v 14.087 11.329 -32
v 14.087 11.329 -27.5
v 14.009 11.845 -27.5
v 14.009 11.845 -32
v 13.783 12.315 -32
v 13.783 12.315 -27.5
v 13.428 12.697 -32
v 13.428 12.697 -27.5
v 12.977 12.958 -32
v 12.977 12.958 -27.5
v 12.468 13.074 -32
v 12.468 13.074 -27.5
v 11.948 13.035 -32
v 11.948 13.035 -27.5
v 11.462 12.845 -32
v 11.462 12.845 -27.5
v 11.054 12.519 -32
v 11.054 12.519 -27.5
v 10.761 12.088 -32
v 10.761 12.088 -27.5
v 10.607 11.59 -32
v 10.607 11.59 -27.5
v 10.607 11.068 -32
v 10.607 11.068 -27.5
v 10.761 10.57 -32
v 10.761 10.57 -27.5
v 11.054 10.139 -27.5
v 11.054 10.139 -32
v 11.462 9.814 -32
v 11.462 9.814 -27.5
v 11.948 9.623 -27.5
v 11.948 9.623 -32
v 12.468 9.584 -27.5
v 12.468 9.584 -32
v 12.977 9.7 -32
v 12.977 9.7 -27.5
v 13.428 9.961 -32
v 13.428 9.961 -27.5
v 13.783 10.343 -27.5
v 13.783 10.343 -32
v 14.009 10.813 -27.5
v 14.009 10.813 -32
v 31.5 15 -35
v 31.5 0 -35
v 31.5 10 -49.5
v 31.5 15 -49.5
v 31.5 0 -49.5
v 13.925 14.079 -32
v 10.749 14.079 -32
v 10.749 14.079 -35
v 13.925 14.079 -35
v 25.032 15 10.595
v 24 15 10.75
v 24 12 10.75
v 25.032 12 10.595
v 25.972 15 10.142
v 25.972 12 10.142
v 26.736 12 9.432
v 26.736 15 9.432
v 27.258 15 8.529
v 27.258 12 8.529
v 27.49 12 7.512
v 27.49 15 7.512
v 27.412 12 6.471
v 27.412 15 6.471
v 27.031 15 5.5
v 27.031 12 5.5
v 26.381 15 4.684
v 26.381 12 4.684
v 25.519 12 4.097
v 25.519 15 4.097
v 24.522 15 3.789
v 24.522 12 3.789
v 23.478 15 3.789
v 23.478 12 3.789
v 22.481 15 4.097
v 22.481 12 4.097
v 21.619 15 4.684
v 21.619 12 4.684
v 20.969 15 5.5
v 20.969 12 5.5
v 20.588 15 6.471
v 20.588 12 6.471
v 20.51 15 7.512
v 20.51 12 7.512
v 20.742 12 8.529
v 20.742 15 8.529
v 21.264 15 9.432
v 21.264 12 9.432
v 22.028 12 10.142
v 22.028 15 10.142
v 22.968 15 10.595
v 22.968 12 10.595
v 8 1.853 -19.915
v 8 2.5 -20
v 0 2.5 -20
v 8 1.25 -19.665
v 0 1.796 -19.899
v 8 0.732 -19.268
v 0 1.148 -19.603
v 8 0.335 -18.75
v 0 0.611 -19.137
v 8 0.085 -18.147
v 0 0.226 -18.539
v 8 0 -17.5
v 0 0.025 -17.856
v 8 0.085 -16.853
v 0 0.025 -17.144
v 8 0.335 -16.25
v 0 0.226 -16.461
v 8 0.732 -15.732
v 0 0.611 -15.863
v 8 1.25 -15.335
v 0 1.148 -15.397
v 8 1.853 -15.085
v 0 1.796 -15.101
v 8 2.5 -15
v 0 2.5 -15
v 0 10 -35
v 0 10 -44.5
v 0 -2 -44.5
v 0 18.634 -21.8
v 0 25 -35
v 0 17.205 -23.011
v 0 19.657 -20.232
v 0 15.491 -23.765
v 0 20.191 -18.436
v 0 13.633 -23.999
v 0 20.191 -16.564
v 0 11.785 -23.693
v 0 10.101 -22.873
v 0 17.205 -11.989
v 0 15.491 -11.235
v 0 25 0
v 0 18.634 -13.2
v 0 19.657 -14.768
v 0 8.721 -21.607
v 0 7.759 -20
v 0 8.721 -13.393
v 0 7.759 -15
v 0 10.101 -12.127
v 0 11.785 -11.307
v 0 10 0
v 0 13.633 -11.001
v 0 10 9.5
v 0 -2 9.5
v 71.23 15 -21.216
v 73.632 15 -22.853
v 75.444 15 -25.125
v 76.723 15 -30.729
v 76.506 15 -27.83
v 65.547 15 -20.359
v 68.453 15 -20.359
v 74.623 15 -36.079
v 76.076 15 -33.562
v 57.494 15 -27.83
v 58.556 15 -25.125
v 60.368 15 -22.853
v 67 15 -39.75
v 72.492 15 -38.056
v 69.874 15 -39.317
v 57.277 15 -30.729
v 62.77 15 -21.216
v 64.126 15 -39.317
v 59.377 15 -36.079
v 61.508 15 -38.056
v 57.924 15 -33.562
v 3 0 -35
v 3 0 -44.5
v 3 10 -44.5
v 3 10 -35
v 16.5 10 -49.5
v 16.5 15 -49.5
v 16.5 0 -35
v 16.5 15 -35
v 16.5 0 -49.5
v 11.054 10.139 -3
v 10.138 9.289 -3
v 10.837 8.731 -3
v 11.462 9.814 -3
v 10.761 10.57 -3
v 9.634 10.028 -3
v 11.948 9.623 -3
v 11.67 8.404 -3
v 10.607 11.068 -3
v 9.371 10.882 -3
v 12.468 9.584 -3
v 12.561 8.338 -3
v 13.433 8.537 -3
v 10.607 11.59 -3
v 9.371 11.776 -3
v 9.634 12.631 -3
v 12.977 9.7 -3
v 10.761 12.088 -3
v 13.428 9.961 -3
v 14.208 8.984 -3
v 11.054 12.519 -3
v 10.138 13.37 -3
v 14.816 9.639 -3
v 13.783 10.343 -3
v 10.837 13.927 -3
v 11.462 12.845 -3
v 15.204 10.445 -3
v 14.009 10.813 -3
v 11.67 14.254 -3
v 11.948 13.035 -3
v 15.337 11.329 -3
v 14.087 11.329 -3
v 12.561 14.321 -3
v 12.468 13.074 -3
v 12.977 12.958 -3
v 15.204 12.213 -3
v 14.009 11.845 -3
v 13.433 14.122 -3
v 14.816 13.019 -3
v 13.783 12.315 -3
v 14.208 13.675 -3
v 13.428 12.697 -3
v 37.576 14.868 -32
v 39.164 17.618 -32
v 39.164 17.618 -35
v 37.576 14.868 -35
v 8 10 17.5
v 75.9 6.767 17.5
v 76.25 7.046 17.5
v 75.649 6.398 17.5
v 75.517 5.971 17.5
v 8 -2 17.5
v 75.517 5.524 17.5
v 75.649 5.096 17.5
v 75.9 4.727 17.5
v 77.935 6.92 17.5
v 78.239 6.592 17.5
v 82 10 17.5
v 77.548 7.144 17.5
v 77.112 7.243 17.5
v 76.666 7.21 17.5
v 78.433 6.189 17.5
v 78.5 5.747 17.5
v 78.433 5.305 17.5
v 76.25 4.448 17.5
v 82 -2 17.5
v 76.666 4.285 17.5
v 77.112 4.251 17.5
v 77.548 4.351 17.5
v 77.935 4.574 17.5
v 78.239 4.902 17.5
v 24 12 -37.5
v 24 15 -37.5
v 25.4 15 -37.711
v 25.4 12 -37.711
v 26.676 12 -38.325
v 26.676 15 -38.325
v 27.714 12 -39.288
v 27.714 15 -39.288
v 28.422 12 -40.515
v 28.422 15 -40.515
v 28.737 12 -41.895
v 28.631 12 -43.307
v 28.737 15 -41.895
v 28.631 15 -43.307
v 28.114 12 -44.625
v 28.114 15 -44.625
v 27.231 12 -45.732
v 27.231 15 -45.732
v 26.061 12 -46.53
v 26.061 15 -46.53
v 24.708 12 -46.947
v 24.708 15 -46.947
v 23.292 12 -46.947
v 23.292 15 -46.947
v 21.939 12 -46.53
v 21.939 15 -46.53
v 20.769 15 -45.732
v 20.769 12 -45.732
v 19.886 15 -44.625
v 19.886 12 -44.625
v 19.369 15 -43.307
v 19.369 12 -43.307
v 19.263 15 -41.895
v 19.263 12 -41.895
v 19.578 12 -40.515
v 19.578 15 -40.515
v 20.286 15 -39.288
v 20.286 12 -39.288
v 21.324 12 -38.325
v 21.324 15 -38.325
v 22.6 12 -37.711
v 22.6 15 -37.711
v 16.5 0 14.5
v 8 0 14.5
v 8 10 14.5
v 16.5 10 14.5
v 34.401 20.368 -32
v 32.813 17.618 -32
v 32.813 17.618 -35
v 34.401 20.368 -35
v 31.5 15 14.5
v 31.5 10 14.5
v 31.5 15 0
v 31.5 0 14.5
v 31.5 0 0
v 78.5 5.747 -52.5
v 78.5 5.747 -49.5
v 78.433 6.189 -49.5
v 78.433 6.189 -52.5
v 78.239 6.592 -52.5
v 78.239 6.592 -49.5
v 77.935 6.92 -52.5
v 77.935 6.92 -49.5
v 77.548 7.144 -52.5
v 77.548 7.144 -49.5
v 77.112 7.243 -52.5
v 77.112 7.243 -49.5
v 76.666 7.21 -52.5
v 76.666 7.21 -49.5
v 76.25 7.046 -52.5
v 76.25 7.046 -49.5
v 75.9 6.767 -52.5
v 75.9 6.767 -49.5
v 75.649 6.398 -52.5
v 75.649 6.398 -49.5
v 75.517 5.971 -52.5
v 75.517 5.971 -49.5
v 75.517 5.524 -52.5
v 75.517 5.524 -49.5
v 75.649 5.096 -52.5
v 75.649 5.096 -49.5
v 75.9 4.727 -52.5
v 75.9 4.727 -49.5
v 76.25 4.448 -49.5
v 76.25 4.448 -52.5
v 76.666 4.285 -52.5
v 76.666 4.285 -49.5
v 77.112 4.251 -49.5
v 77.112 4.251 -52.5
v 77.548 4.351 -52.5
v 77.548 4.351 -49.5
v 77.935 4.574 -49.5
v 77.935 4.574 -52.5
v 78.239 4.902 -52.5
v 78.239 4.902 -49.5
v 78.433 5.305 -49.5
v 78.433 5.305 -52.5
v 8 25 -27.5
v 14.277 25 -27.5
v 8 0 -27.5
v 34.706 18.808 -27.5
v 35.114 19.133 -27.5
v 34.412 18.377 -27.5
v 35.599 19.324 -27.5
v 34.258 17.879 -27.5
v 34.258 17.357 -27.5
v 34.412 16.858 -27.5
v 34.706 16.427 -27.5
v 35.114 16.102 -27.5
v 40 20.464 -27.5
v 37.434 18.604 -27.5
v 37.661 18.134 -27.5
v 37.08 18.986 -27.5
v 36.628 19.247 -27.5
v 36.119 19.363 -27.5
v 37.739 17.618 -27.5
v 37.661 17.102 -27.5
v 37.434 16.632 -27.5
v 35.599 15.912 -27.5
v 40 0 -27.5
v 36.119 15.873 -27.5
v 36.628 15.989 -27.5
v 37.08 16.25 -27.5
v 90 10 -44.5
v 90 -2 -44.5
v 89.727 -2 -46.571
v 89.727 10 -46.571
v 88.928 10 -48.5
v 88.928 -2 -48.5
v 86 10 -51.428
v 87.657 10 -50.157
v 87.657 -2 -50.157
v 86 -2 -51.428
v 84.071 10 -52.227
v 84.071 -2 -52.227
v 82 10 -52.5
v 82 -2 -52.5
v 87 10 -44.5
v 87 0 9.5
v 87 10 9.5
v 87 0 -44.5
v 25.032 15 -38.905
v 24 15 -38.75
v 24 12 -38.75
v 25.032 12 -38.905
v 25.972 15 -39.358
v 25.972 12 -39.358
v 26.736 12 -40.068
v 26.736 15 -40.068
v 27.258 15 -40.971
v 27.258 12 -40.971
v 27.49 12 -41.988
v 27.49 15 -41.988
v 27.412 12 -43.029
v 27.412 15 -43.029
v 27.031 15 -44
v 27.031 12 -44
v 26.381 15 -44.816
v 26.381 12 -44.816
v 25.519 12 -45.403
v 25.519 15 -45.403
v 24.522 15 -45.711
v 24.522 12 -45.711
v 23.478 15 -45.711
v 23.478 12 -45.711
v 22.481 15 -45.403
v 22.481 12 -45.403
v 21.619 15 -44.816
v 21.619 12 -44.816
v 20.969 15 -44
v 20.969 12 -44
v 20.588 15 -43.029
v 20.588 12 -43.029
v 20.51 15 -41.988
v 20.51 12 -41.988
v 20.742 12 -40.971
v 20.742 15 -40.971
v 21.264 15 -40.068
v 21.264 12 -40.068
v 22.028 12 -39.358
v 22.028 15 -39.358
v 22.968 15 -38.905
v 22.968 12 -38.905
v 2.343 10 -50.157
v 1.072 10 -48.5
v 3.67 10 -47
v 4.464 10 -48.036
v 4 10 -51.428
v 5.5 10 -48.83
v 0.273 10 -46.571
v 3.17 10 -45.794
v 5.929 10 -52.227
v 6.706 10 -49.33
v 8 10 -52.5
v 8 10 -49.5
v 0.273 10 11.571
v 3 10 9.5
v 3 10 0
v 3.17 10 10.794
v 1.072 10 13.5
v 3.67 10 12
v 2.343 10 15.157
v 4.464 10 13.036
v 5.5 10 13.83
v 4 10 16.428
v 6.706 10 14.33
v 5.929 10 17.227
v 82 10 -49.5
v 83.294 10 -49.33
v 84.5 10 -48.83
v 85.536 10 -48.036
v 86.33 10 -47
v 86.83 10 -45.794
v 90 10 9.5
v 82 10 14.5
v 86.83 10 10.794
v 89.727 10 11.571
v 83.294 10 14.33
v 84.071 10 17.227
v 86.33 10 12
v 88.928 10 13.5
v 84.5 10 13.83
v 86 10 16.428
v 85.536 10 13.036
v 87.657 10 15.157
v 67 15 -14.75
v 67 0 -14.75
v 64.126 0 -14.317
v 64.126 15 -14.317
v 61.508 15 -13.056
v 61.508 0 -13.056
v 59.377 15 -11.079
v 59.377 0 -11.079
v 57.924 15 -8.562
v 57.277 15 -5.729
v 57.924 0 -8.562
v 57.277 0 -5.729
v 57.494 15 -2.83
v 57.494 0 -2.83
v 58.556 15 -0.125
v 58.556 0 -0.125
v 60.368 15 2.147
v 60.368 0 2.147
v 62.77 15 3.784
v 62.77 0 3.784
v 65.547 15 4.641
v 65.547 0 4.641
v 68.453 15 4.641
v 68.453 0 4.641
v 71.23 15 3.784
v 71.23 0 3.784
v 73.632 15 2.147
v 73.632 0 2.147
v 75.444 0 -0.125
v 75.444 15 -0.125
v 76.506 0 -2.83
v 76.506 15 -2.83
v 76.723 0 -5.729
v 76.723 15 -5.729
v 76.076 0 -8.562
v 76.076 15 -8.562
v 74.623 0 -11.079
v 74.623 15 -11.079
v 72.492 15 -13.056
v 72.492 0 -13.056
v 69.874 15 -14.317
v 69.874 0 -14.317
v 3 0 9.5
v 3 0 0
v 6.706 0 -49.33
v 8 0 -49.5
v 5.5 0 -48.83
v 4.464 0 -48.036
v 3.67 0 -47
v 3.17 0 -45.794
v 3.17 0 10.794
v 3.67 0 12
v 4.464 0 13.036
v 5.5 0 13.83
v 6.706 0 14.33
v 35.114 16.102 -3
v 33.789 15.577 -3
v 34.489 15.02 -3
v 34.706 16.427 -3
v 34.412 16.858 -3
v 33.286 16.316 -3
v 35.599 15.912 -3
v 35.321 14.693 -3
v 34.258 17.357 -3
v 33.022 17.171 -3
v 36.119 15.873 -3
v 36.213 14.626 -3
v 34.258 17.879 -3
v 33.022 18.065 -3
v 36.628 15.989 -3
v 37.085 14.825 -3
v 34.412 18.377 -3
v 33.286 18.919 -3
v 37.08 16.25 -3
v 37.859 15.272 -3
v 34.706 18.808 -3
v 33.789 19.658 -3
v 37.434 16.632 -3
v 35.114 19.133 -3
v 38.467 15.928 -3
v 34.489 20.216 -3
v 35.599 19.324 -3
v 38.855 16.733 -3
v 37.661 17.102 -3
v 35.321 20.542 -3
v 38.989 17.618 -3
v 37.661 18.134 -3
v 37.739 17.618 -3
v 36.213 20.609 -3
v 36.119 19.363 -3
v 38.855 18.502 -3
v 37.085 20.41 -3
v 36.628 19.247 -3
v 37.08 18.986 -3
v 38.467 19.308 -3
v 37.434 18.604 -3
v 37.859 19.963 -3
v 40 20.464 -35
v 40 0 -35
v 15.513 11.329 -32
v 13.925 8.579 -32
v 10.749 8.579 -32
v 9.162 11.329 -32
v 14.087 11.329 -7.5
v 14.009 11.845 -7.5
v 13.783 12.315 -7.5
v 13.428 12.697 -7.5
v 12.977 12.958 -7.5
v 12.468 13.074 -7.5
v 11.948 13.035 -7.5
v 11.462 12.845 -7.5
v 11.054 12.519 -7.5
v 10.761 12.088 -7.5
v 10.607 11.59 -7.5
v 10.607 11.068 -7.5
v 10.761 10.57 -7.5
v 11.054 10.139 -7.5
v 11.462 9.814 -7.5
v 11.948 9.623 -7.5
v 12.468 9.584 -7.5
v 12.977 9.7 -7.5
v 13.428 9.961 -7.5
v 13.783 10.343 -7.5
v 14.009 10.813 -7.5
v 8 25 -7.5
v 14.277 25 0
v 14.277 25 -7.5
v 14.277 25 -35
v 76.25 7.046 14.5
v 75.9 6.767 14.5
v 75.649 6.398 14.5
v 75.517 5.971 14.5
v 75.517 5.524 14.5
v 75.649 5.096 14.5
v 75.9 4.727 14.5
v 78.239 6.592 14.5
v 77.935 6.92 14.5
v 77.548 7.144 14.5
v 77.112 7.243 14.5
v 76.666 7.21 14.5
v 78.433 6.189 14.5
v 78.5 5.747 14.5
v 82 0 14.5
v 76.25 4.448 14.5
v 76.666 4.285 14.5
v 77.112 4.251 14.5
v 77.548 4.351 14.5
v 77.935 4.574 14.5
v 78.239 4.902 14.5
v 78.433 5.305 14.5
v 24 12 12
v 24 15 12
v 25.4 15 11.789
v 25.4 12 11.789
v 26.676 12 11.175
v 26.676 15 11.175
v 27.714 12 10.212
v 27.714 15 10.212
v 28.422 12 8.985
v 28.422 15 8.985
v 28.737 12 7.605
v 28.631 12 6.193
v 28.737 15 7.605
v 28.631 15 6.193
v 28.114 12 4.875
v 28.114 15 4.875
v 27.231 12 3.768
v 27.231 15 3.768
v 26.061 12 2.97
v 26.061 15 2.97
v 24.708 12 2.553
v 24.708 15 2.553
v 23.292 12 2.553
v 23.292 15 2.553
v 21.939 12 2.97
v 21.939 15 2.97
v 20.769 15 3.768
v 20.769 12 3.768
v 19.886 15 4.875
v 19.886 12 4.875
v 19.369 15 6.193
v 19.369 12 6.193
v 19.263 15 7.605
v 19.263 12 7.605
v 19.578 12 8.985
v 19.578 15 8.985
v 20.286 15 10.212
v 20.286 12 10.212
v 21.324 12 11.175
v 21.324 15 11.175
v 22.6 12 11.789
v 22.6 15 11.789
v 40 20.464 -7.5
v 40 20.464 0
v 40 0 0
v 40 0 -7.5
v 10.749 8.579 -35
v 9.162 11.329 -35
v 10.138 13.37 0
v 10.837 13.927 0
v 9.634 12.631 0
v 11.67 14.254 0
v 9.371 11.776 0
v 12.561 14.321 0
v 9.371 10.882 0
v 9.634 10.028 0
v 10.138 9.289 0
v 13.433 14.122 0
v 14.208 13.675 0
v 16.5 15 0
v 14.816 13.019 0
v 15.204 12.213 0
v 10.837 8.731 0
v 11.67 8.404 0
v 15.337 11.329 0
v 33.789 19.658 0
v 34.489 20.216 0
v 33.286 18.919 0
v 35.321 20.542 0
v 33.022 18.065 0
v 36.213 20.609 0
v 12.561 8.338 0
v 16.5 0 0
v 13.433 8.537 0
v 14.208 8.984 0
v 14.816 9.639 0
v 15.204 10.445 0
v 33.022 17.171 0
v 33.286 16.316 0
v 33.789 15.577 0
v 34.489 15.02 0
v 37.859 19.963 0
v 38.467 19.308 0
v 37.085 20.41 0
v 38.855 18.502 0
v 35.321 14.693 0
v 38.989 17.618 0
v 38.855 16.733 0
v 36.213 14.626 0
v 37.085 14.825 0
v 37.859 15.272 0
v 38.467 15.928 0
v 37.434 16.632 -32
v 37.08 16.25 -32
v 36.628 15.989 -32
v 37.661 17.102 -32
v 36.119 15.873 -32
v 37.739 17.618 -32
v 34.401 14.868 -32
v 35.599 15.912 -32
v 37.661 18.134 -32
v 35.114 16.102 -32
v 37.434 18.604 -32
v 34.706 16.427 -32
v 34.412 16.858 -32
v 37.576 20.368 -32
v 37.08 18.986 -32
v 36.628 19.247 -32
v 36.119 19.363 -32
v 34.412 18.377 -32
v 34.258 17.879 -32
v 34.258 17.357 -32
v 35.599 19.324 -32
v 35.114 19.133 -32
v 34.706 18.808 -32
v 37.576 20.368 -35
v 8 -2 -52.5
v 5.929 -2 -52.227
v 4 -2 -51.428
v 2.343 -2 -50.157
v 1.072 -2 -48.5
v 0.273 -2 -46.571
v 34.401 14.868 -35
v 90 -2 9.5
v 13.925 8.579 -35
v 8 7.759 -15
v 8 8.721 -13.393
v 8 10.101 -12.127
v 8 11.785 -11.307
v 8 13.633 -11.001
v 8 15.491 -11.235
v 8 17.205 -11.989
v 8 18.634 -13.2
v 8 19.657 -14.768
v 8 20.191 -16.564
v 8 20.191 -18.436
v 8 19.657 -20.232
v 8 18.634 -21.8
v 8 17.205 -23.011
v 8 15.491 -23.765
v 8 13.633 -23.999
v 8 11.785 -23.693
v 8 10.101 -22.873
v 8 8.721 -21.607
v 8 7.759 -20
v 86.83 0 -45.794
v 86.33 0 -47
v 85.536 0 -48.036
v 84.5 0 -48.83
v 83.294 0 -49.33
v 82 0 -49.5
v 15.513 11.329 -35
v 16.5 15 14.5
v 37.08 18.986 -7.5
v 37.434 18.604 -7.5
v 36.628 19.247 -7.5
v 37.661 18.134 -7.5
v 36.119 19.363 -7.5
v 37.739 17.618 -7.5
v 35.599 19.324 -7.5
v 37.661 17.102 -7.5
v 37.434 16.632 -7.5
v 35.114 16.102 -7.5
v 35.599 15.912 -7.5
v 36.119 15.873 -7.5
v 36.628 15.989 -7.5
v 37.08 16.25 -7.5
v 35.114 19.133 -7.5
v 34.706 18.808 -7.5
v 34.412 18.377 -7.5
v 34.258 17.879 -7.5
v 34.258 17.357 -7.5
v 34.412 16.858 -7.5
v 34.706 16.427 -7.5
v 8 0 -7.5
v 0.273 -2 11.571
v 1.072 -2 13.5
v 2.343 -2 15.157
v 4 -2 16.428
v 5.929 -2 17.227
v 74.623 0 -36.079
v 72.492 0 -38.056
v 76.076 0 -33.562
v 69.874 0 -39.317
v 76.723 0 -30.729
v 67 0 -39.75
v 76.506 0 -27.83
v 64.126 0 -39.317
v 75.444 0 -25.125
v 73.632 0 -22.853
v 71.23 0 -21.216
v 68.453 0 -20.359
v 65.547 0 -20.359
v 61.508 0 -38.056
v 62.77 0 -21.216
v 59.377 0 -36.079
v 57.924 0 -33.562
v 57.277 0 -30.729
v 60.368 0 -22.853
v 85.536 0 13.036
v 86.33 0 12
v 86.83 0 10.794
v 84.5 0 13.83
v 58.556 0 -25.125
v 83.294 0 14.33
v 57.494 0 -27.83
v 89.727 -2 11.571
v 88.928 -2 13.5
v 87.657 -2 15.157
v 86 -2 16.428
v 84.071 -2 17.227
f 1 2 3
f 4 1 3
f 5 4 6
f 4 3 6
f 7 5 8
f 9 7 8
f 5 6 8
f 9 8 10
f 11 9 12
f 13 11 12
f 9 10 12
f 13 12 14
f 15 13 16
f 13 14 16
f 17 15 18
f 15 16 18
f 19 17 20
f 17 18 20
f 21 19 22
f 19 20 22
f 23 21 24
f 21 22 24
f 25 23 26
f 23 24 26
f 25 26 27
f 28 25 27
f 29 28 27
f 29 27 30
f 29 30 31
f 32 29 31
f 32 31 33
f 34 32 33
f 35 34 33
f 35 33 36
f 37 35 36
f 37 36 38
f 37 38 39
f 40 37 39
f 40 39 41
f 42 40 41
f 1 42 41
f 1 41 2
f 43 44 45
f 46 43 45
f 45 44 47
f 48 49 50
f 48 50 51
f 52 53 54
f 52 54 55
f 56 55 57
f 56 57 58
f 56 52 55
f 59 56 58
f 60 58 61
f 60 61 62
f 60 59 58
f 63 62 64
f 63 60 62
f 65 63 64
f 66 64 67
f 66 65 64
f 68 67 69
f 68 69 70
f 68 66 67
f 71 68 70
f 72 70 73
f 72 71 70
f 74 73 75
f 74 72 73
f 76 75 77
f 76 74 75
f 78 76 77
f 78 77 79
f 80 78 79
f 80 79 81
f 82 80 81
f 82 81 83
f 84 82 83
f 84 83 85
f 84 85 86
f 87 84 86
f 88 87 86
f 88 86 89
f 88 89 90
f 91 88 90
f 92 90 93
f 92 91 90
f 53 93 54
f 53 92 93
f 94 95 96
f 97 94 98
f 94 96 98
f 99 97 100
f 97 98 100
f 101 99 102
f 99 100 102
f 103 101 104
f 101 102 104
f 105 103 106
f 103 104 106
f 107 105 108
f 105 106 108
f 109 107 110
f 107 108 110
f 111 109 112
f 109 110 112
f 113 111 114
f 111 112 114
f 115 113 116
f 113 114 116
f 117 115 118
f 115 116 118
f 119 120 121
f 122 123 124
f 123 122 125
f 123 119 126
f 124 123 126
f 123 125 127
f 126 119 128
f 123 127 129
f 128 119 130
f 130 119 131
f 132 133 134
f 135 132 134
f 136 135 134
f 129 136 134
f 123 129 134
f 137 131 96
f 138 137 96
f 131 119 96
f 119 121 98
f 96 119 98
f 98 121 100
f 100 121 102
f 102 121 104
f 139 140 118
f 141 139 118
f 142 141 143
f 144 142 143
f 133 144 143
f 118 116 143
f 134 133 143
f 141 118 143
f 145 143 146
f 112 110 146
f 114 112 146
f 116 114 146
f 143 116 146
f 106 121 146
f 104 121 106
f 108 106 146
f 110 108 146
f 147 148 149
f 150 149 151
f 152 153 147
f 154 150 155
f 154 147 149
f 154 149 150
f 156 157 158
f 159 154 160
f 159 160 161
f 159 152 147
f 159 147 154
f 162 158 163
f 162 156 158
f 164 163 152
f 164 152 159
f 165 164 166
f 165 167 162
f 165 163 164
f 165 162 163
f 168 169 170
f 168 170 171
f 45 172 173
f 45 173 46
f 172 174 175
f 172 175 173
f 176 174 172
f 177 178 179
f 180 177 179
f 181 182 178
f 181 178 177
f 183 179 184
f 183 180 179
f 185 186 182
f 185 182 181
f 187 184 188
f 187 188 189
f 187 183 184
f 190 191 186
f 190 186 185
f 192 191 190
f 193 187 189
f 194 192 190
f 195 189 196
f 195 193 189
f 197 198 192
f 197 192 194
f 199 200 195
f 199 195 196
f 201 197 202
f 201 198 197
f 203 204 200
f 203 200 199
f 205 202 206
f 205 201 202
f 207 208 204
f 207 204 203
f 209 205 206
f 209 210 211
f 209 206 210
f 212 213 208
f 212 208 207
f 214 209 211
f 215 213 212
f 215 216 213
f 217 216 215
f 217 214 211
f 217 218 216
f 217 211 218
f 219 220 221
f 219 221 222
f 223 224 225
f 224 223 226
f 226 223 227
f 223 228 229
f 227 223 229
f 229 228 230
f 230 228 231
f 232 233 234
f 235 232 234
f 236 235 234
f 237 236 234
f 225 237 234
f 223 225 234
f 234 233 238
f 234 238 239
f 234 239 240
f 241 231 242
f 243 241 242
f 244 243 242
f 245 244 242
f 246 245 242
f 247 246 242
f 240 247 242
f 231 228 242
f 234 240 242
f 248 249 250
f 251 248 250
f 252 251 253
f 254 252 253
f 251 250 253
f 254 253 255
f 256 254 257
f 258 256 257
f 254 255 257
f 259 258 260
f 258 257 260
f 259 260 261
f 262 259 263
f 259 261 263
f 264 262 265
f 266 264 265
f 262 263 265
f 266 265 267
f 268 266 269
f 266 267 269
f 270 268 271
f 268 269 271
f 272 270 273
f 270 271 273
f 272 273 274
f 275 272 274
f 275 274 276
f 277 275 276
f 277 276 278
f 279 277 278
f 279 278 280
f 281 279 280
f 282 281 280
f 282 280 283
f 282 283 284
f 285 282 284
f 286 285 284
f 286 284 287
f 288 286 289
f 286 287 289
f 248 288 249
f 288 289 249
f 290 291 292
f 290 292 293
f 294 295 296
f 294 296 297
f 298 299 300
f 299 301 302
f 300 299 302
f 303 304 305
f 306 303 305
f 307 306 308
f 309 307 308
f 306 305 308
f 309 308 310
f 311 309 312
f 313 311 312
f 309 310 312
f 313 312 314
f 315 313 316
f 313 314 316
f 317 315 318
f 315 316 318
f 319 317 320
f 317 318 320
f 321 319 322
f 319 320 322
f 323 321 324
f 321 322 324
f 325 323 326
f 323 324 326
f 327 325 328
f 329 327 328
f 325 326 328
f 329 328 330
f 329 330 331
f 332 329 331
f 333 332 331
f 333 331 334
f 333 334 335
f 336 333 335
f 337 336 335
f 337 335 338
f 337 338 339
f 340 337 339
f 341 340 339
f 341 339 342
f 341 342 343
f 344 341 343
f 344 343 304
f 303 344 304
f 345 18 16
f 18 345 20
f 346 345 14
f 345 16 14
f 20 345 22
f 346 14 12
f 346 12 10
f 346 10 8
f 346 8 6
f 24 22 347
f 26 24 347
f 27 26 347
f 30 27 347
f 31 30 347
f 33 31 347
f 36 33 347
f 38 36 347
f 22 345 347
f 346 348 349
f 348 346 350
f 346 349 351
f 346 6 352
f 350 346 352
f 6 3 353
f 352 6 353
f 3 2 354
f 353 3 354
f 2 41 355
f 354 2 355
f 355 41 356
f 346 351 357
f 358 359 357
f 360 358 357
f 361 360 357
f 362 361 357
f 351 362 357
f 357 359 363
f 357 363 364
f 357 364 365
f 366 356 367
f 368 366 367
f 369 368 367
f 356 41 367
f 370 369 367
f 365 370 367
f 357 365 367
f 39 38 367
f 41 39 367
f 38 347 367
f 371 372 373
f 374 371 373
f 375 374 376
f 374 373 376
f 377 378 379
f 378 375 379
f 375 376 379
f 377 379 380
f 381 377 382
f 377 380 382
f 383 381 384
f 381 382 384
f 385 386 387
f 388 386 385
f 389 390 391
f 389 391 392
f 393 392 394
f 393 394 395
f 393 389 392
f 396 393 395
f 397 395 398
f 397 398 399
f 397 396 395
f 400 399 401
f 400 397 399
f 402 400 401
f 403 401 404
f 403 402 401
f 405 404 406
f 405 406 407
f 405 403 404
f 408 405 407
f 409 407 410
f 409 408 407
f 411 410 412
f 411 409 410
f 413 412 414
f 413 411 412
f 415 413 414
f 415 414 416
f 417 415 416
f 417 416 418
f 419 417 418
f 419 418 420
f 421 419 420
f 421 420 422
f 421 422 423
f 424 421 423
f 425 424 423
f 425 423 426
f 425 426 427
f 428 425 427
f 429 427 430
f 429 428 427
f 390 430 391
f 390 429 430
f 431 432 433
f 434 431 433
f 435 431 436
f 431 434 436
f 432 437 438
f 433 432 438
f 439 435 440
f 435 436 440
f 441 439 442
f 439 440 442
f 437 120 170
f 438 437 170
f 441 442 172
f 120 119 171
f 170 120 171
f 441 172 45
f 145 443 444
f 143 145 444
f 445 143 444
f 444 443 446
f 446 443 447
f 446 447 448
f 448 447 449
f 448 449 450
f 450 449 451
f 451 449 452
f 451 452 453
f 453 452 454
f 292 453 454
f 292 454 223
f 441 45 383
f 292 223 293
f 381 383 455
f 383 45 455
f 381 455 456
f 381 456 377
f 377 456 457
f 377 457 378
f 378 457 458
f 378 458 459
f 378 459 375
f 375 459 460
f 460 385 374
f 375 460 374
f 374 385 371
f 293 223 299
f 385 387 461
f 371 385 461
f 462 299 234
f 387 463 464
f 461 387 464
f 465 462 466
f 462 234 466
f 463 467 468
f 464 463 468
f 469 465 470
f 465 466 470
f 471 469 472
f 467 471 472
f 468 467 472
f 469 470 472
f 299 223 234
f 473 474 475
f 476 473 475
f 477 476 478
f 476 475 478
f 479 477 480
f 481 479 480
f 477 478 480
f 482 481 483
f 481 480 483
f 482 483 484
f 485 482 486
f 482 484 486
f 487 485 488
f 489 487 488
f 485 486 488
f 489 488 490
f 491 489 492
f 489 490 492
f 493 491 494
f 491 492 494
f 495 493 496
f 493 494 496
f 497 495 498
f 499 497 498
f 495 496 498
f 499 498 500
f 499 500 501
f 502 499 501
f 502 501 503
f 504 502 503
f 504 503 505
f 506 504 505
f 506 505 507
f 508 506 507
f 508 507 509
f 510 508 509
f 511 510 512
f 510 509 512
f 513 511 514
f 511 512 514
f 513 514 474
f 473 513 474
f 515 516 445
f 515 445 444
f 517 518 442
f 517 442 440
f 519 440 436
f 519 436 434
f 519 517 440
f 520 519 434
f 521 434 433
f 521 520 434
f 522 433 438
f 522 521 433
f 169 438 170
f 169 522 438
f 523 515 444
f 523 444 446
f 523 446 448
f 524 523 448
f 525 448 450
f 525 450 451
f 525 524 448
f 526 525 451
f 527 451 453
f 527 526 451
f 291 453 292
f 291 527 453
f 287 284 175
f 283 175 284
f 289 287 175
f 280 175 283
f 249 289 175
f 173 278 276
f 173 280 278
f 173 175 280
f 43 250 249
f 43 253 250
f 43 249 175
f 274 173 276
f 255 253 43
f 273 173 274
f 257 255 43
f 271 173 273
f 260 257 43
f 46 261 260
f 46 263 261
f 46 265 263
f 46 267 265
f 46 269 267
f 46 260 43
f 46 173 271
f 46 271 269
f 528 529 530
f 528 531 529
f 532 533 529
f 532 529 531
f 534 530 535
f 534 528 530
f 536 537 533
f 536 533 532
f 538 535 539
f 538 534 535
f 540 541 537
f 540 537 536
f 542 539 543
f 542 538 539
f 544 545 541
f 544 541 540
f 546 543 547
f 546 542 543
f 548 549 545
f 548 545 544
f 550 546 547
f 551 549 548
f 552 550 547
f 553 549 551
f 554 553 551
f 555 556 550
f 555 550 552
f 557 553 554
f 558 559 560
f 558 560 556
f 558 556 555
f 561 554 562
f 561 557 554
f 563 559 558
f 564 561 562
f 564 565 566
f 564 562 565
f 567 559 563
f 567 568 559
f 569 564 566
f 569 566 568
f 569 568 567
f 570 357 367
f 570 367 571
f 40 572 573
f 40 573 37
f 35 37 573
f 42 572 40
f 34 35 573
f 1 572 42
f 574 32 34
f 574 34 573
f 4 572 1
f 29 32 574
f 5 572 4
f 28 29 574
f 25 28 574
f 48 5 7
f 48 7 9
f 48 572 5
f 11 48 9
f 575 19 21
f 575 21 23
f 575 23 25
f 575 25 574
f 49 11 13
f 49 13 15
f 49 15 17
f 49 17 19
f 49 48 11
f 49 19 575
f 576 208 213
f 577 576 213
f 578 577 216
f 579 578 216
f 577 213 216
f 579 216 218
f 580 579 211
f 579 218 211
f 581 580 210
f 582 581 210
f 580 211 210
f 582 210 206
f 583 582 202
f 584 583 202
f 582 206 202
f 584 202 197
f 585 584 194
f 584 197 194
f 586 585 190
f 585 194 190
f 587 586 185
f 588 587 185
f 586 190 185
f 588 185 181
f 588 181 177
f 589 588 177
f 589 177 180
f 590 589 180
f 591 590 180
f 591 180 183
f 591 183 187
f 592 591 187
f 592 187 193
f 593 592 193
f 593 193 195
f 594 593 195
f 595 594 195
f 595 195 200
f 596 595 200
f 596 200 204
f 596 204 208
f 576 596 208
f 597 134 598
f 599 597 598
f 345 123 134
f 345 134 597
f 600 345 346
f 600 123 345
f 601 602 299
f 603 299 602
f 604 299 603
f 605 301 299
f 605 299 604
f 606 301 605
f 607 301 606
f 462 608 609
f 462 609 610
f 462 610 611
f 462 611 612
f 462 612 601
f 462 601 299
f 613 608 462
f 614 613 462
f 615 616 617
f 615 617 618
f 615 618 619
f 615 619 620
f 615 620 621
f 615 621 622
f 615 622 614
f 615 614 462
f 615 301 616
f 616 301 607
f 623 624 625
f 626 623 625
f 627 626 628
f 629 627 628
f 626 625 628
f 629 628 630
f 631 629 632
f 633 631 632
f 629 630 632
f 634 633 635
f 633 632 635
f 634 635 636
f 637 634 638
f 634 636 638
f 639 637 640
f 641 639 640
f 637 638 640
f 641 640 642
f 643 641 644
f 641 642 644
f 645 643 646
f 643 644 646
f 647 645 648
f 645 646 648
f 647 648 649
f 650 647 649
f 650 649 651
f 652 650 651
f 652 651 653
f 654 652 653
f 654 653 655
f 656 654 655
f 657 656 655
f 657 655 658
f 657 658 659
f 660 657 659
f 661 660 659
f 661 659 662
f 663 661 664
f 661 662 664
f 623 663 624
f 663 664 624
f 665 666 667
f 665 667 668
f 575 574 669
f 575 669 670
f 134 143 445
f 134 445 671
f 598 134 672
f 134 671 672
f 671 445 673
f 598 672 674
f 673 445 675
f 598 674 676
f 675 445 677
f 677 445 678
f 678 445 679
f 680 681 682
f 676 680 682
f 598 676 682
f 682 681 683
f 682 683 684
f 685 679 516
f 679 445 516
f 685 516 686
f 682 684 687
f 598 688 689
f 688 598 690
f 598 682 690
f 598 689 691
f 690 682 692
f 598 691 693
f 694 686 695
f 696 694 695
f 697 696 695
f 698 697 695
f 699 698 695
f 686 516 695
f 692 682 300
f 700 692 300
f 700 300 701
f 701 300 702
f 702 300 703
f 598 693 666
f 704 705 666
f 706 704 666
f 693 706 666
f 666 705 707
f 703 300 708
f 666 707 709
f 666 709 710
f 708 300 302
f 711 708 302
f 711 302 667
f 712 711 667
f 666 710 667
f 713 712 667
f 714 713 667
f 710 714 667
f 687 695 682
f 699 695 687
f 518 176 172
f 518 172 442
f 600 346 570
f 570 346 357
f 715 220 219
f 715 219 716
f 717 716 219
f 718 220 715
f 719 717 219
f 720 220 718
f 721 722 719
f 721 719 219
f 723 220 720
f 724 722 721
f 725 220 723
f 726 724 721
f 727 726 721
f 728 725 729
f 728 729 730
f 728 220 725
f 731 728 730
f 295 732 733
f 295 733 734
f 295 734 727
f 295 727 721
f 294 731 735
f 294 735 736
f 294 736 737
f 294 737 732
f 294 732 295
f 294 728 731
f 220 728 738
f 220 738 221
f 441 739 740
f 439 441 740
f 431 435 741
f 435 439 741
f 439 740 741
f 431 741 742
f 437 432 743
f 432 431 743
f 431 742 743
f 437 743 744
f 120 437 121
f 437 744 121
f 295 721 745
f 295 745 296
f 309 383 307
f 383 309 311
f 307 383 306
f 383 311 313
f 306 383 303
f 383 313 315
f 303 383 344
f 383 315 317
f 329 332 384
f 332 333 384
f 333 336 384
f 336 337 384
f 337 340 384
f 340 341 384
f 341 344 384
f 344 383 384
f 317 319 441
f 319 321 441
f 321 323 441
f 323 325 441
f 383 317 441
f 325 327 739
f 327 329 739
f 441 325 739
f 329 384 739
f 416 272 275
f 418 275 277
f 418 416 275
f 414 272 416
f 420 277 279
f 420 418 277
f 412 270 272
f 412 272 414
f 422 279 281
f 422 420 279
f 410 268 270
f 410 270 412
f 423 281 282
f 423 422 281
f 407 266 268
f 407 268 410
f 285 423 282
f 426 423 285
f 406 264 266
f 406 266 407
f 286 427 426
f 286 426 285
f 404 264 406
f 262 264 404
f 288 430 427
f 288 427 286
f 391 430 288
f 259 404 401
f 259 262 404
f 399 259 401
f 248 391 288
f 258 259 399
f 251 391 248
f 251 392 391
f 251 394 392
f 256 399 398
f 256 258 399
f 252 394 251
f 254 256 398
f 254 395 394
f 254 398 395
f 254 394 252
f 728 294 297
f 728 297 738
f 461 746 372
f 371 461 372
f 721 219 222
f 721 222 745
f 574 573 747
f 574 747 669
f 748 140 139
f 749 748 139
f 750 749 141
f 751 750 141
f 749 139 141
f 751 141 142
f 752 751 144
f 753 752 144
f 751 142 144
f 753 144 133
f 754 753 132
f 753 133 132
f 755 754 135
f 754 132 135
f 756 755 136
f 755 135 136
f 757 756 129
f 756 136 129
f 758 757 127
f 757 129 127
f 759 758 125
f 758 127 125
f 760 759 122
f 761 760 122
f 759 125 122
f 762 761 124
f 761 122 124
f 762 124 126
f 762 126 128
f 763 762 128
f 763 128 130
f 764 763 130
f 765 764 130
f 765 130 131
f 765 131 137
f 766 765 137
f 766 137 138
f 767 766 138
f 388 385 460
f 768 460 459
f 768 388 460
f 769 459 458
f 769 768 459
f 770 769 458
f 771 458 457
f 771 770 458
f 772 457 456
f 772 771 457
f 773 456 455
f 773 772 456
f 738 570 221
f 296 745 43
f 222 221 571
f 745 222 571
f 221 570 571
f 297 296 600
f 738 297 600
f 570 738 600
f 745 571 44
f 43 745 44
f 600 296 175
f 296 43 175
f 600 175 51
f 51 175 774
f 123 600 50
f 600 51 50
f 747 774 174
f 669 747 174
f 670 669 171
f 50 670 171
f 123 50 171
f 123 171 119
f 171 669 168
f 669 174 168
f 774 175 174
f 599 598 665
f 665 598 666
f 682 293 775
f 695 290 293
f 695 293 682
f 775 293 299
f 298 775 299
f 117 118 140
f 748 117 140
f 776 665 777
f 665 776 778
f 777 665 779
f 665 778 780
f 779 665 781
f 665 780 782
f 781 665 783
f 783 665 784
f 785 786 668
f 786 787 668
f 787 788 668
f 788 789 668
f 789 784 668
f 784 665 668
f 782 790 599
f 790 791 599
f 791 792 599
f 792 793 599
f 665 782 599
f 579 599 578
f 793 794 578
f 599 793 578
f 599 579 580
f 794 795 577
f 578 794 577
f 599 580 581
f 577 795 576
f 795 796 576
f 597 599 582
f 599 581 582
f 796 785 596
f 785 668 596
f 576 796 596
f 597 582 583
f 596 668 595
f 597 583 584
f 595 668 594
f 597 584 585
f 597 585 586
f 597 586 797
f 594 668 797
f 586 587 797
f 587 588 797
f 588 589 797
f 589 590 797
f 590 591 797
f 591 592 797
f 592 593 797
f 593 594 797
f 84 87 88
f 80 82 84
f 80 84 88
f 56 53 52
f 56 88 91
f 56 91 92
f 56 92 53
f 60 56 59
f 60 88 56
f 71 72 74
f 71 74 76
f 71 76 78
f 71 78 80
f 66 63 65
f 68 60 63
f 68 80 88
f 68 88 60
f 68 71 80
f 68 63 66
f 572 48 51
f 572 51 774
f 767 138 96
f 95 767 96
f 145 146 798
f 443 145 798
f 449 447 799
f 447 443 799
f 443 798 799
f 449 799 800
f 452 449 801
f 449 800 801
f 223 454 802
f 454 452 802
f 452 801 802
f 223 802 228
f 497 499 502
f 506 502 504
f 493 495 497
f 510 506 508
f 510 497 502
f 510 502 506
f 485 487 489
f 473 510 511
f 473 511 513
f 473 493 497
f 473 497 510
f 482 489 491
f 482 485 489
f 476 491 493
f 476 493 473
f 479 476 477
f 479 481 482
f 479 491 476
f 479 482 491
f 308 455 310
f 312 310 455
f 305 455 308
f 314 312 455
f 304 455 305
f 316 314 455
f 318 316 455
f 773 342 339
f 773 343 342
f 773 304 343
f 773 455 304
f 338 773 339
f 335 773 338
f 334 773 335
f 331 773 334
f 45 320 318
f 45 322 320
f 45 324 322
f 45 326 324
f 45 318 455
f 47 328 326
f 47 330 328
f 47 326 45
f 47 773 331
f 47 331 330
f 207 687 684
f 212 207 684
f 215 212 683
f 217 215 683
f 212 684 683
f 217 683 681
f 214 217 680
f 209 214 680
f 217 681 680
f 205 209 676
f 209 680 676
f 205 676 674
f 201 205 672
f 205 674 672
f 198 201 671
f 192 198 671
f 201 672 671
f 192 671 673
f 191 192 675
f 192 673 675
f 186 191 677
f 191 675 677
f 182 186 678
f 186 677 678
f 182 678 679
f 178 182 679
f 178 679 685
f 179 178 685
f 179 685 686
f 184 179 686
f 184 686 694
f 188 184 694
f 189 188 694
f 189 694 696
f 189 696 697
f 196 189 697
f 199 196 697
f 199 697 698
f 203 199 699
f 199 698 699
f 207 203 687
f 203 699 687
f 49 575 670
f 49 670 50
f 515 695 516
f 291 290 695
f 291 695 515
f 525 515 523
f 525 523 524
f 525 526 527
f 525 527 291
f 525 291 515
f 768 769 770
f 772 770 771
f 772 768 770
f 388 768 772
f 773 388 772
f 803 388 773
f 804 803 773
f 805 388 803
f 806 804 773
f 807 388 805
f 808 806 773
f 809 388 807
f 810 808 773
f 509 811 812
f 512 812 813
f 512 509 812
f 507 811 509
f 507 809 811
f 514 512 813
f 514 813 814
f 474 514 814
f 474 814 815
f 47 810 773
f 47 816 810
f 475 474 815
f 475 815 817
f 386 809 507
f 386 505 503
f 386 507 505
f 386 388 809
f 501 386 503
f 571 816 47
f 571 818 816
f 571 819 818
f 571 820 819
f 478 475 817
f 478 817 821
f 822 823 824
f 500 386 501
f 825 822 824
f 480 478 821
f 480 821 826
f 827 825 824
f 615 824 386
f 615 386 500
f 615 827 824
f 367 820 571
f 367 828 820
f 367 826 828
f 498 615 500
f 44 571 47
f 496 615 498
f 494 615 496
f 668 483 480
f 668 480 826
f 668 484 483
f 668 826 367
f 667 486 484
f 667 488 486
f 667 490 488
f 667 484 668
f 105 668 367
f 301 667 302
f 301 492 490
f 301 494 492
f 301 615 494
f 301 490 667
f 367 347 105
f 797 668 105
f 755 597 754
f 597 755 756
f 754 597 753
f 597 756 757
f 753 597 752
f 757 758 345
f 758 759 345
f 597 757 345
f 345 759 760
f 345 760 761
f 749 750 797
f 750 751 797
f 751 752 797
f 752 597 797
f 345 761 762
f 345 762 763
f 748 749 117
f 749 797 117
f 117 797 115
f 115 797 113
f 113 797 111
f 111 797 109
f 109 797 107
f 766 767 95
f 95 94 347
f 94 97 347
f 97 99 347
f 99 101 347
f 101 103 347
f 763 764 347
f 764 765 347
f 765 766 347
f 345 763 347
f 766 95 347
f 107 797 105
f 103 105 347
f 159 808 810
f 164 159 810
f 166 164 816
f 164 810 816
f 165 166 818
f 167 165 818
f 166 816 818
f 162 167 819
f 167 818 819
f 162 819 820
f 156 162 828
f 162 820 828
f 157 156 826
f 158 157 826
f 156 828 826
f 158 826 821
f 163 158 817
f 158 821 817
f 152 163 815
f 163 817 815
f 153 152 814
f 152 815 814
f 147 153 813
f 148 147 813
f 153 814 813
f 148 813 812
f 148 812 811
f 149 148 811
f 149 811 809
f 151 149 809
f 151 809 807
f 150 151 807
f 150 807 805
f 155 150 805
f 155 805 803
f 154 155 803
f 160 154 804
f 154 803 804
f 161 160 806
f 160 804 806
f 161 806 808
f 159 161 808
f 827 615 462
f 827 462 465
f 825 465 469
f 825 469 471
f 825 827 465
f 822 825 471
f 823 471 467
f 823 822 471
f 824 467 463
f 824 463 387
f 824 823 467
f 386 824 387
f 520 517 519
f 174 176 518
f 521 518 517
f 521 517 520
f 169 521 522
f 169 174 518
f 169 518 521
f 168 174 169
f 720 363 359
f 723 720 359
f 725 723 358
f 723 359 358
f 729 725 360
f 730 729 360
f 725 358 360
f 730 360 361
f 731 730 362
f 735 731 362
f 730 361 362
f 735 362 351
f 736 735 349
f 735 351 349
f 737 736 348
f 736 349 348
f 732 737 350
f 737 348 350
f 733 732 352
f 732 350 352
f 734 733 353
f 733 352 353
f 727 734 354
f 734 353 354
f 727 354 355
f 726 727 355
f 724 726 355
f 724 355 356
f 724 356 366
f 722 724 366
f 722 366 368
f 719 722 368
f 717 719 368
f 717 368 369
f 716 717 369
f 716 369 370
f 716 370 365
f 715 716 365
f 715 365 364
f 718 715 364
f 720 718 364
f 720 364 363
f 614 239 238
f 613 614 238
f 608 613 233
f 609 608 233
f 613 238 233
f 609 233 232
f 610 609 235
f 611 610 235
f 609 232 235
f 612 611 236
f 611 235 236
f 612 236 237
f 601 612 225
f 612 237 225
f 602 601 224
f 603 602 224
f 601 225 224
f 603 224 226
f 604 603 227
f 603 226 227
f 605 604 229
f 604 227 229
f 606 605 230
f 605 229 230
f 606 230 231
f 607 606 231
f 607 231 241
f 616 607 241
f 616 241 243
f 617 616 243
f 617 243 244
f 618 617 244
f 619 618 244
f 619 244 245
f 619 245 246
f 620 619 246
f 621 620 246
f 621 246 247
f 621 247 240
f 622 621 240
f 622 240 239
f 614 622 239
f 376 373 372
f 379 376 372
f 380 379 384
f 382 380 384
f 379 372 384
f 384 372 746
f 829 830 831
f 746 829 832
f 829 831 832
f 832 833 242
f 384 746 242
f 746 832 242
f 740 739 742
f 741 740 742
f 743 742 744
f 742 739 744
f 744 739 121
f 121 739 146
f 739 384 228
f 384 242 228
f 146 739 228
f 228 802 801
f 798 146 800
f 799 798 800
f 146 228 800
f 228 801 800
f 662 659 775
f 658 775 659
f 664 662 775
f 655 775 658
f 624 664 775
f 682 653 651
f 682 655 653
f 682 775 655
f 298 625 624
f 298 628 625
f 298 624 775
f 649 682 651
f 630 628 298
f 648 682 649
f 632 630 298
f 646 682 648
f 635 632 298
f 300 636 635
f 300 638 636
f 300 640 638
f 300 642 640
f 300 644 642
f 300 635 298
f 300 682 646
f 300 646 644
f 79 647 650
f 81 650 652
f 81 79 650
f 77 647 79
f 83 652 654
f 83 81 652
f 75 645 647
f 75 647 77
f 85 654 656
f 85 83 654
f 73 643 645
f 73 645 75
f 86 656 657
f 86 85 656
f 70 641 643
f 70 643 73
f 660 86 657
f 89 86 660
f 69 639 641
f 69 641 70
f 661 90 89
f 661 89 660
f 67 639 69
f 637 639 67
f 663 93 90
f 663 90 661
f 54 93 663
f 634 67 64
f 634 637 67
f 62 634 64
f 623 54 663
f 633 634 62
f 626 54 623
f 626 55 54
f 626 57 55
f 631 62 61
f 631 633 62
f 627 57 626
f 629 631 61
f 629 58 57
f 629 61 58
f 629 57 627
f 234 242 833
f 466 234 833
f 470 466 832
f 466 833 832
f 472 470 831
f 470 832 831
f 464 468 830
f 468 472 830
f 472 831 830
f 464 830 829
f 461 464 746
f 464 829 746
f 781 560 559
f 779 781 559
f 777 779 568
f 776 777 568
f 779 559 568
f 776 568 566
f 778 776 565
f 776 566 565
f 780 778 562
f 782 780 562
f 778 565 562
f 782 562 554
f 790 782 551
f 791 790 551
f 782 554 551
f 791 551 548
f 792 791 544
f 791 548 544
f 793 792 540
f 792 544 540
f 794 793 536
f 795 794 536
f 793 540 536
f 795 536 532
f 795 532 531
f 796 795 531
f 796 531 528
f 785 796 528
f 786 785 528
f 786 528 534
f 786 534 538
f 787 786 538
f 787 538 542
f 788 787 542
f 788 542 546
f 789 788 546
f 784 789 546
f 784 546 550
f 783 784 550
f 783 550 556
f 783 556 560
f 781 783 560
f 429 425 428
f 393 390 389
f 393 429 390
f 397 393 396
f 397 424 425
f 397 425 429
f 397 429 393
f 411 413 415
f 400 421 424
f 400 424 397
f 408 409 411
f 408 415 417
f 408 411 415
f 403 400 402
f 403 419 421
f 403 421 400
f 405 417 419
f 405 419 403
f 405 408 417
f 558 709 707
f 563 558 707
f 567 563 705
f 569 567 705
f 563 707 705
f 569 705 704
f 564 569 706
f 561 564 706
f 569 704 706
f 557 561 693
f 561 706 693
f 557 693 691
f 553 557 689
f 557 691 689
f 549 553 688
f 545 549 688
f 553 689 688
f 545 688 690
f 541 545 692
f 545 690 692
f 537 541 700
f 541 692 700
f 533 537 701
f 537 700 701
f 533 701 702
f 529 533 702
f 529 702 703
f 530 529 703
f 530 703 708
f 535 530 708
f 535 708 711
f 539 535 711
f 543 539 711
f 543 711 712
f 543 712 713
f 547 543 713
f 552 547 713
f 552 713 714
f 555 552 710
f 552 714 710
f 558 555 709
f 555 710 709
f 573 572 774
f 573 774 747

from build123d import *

# Parameters (mm, degrees)
BOSS_EXTRUDE1_DEPTH = 25
CUT_EXTRUDE1_REACH  = 60.737
SKETCH2_R           = 1.75
BOSS_EXTRUDE2_DEPTH = 10
BOSS_EXTRUDE3_START = 2
BOSS_EXTRUDE3_DEPTH = 2
SKETCH5_R           = 1.5
CUT_EXTRUDE2_DEPTH  = 117.726175299
SKETCH6_R           = 3
SKETCH6_R_2         = 1.75
CUT_EXTRUDE3_DEPTH  = 3
CUT_EXTRUDE4_START  = -3
SKETCH7_R           = 1.75
CUT_EXTRUDE4_DEPTH  = 3
SKETCH8_W           = 15
SKETCH8_H           = 14.5
BOSS_EXTRUDE4_DEPTH = 15
SKETCH9_R           = 4.75
SKETCH9_R_2         = 3.5
CUT_EXTRUDE5_DEPTH  = 3
SKETCH11_R          = 9.75
BOSS_EXTRUDE5_DEPTH = 15
CUT_EXTRUDE6_REACH  = 109.151


with BuildPart() as part:
    # Sketch1 → Boss-Extrude1 (new body)
    with BuildSketch(Plane(origin=(0, 0, 0), x_dir=(1, 0, 0), z_dir=(0, 1, 0))):
        Polygon((40, 7.5), (8, 7.5), (8, 27.5), (40, 27.5), (40, 35), (0, 35), (0, 0), (40, 0), align=None)
    extrude(amount=BOSS_EXTRUDE1_DEPTH)

    # Cut-Extrude1: up to this face of the body (flat: up to its plane)
    cut_extrude1_end = Plane(part.part.faces().sort_by_distance((20, 12.5, -35))[0])
    # Sketch2 → Cut-Extrude1 (cut, up to the picked face)
    with BuildSketch(Plane.XY, mode=Mode.PRIVATE) as cut_extrude1_sk1:
        with Locations((35.988510068, 17.617712577)):
            Circle(SKETCH2_R)
    cut_extrude1_tool1 = split(extrude(cut_extrude1_sk1.sketch, amount=-CUT_EXTRUDE1_REACH, mode=Mode.PRIVATE), bisect_by=cut_extrude1_end, keep=Keep.BOTH, mode=Mode.PRIVATE)
    # Sketch2 → Cut-Extrude1 (cut, up to the picked face)
    with BuildSketch(Plane.XY, mode=Mode.PRIVATE) as cut_extrude1_sk2:
        with Locations((12.337201721, 11.329182265)):
            Circle(SKETCH2_R)
    cut_extrude1_tool2 = split(extrude(cut_extrude1_sk2.sketch, amount=-CUT_EXTRUDE1_REACH, mode=Mode.PRIVATE), bisect_by=cut_extrude1_end, keep=Keep.BOTH, mode=Mode.PRIVATE)
    # Sketch2 → Cut-Extrude1 (cut, up to the picked face)
    with BuildSketch(Plane.XY, mode=Mode.PRIVATE) as cut_extrude1_sk3:
        Polygon((40, 25), (14.27717431, 25), (40, 20.464371811), align=None)
    cut_extrude1_tool3 = split(extrude(cut_extrude1_sk3.sketch, amount=-CUT_EXTRUDE1_REACH, mode=Mode.PRIVATE), bisect_by=cut_extrude1_end, keep=Keep.BOTH, mode=Mode.PRIVATE)
    add(cut_extrude1_tool1.solids().sort_by(Axis((35.98851, 17.617713, 0), (0, 0, -1)))[0], mode=Mode.SUBTRACT)
    add(cut_extrude1_tool2.solids().sort_by(Axis((12.337202, 11.329182, 0), (0, 0, -1)))[0], mode=Mode.SUBTRACT)
    add(cut_extrude1_tool3.solids().sort_by(Axis((31.425725, 23.488124, 0), (0, 0, -1)))[0], mode=Mode.SUBTRACT)

    # Sketch3 → Boss-Extrude2 (add)
    with BuildSketch(Plane.XZ):
        with BuildLine():
            ThreePointArc((82, 14.5), (85.535533906, 13.035533906), (87, 9.5))
            Line((87, 9.5), (87, -44.5))
            ThreePointArc((87, -44.5), (85.535533906, -48.035533906), (82, -49.5))
            Line((82, -49.5), (8, -49.5))
            ThreePointArc((8, -49.5), (4.464466094, -48.035533906), (3, -44.5))
            Line((3, -44.5), (3, -35))
            Line((3, -35), (0, -35))
            Line((0, -35), (0, -44.5))
            ThreePointArc((0, -44.5), (2.343145751, -50.156854249), (8, -52.5))
            Line((8, -52.5), (82, -52.5))
            ThreePointArc((82, -52.5), (87.656854249, -50.156854249), (90, -44.5))
            Line((90, -44.5), (90, 9.5))
            ThreePointArc((90, 9.5), (87.656854249, 15.156854249), (82, 17.5))
            Line((82, 17.5), (8, 17.5))
            ThreePointArc((8, 17.5), (2.343145751, 15.156854249), (0, 9.5))
            Line((0, 9.5), (0, 0))
            Line((0, 0), (3, 0))
            Line((3, 0), (3, 9.5))
            ThreePointArc((3, 9.5), (4.464466094, 13.035533906), (8, 14.5))
            Line((8, 14.5), (82, 14.5))
        make_face()
    extrude(amount=-BOSS_EXTRUDE2_DEPTH)

    # Sketch4 → Boss-Extrude3 (add)
    with BuildSketch(Plane.XZ.offset(BOSS_EXTRUDE3_START)):
        with BuildLine():
            Line((82, -52.5), (8, -52.5))
            ThreePointArc((8, -52.5), (2.343145751, -50.156854249), (0, -44.5))
            Line((0, -44.5), (0, 9.5))
            ThreePointArc((0, 9.5), (2.343145751, 15.156854249), (8, 17.5))
            Line((8, 17.5), (82, 17.5))
            ThreePointArc((82, 17.5), (87.656854249, 15.156854249), (90, 9.5))
            Line((90, 9.5), (90, -44.5))
            ThreePointArc((90, -44.5), (87.656854249, -50.156854249), (82, -52.5))
        make_face()
    extrude(amount=-BOSS_EXTRUDE3_DEPTH)

    # Sketch5 → Cut-Extrude2 (cut, through all)
    with BuildSketch(Plane.XY.offset(17.5)):
        with Locations((77, 5.747215229)):
            Circle(SKETCH5_R)
    extrude(amount=-CUT_EXTRUDE2_DEPTH, mode=Mode.SUBTRACT)

    # Sketch6 → Cut-Extrude3 (cut)
    # profile 1 of 2: a face of its own
    with BuildSketch(Plane.XY):
        with Locations((12.337201721, 11.329182265)):
            Circle(SKETCH6_R)
        with Locations((12.337201721, 11.329182265)):
            Circle(SKETCH6_R_2, mode=Mode.SUBTRACT)
    # profile 2 of 2: a face of its own
    with BuildSketch(Plane.XY):
        with Locations((35.988510068, 17.617712577)):
            Circle(SKETCH6_R)
        with Locations((35.988510068, 17.617712577)):
            Circle(SKETCH6_R_2, mode=Mode.SUBTRACT)
    extrude(amount=-CUT_EXTRUDE3_DEPTH, mode=Mode.SUBTRACT)

    # Sketch7 → Cut-Extrude4 (cut)
    # profile 1 of 2: a face of its own
    with BuildSketch(Plane(origin=(0, 0, -35), x_dir=(-1, 0, 0), z_dir=(0, 0, -1)).offset(CUT_EXTRUDE4_START)):
        Polygon((-37.576223308, 14.867712577), (-34.400796828, 14.867712577), (-32.813083587, 17.617712577), (-34.400796828, 20.367712577), (-37.576223308, 20.367712577), (-39.163936548, 17.617712577), align=None)
        with Locations((-35.988510068, 17.617712577)):
            Circle(SKETCH7_R, mode=Mode.SUBTRACT)
    # profile 2 of 2: a face of its own
    with BuildSketch(Plane(origin=(0, 0, -35), x_dir=(-1, 0, 0), z_dir=(0, 0, -1)).offset(CUT_EXTRUDE4_START)):
        Polygon((-13.924914961, 8.579182265), (-10.749488481, 8.579182265), (-9.16177524, 11.329182265), (-10.749488481, 14.079182265), (-13.924914961, 14.079182265), (-15.512628201, 11.329182265), align=None)
        with Locations((-12.337201721, 11.329182265)):
            Circle(SKETCH7_R, mode=Mode.SUBTRACT)
    extrude(amount=CUT_EXTRUDE4_DEPTH, mode=Mode.SUBTRACT)

    # Sketch8 → Boss-Extrude4 (add)
    with BuildSketch(Plane(origin=(0, 0, 0), x_dir=(1, 0, 0), z_dir=(0, 1, 0))):
        with Locations((24, -7.25)):
            Rectangle(SKETCH8_W, SKETCH8_H)
        with Locations((24, 42.25)):
            Rectangle(SKETCH8_W, SKETCH8_H)
    extrude(amount=BOSS_EXTRUDE4_DEPTH)

    # Sketch9 → Cut-Extrude5 (cut)
    # profile 1 of 2: a face of its own
    with BuildSketch(Plane(origin=(0, 15, 0), x_dir=(1, 0, 0), z_dir=(0, 1, 0))):
        with Locations(Location((24, 42.25, 0), (0, 0, 270))):
            Circle(SKETCH9_R)
        with Locations(Location((24, 42.25, 0), (0, 0, 270))):
            Circle(SKETCH9_R_2, mode=Mode.SUBTRACT)
    # profile 2 of 2: a face of its own
    with BuildSketch(Plane(origin=(0, 15, 0), x_dir=(1, 0, 0), z_dir=(0, 1, 0))):
        with Locations(Location((24, -7.25, 0), (0, 0, 270))):
            Circle(SKETCH9_R)
        with Locations(Location((24, -7.25, 0), (0, 0, 270))):
            Circle(SKETCH9_R_2, mode=Mode.SUBTRACT)
    extrude(amount=-CUT_EXTRUDE5_DEPTH, mode=Mode.SUBTRACT)

    # Sketch11 → Boss-Extrude5 (add)
    with BuildSketch(Plane(origin=(0, 0, 0), x_dir=(1, 0, 0), z_dir=(0, 1, 0))):
        with Locations(Location((67, 30, 0), (0, 0, 90))):
            Circle(SKETCH11_R)
        with Locations(Location((67, 5, 0), (0, 0, 90))):
            Circle(SKETCH11_R)
    extrude(amount=BOSS_EXTRUDE5_DEPTH)

    # Sketch12 → Cut-Extrude6 (cut, up to next)
    with BuildSketch(Plane.ZY, mode=Mode.PRIVATE) as cut_extrude6_sk1:
        with BuildLine():
            Line((-20, 7.759198983), (-20, 2.5))
            ThreePointArc((-20, 2.5), (-17.5, 0), (-15, 2.5))
            Line((-15, 2.5), (-15, 7.759198983))
            ThreePointArc((-15, 7.759198983), (-17.5, 20.259198983), (-20, 7.759198983))
        make_face()
    cut_extrude6_tool1 = extrude(cut_extrude6_sk1.sketch, amount=-CUT_EXTRUDE6_REACH, mode=Mode.PRIVATE) & part.part
    add(cut_extrude6_tool1.solids().sort_by_distance((0, 11.74048, -17.5))[0], mode=Mode.SUBTRACT)


solid = part.part
